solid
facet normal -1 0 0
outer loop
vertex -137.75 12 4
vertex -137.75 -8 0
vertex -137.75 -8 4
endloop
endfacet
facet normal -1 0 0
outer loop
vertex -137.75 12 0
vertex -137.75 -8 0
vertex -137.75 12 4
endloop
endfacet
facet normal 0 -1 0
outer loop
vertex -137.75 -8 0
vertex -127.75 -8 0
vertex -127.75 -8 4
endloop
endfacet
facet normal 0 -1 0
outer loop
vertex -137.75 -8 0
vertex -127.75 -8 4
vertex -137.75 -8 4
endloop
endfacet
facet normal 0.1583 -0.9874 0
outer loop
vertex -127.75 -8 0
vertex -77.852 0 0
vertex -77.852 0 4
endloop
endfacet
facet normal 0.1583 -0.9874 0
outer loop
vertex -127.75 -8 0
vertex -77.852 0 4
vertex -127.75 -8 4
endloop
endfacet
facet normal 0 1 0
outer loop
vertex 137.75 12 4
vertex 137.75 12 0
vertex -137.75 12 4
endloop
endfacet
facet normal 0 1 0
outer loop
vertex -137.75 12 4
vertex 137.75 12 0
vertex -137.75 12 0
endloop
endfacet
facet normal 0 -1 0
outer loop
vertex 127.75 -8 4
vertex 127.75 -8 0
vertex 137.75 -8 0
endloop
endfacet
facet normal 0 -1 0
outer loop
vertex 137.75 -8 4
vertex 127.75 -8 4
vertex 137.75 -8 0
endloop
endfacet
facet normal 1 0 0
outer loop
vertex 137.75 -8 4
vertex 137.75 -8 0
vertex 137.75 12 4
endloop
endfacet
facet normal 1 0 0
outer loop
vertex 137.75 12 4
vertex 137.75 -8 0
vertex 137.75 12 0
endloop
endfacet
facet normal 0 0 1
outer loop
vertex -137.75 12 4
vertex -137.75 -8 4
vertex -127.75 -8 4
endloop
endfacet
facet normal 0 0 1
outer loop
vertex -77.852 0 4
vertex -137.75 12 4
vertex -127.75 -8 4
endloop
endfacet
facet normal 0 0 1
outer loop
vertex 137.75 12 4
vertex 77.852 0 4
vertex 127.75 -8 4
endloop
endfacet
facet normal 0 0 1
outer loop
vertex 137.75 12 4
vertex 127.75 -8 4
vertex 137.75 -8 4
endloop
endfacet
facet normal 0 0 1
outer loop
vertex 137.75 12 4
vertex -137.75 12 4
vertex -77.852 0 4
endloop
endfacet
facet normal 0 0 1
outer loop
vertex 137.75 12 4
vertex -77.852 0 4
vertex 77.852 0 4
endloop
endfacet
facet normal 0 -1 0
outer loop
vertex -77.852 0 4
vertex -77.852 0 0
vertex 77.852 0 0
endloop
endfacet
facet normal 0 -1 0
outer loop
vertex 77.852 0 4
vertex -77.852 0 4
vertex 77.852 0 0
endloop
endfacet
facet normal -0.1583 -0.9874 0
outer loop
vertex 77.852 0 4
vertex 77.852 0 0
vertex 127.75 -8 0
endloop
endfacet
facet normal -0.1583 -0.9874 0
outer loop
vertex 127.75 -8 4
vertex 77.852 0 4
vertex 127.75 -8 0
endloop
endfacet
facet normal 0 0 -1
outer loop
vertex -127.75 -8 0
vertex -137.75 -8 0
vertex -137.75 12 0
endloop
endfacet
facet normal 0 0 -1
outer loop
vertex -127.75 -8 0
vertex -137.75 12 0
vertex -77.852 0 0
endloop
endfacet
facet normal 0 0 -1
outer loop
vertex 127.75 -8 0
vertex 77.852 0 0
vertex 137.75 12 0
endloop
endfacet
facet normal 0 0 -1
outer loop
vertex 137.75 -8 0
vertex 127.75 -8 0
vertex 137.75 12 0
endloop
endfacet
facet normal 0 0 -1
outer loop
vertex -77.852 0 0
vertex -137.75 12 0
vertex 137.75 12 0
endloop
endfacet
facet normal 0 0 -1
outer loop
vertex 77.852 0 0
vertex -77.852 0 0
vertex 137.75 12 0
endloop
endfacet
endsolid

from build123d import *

# Parameters (mm, degrees)
BOSS_EXTRUDE1_DEPTH = 4


with BuildPart() as part:
    # Sketch1 → Boss-Extrude1 (new body)
    with BuildSketch(Plane.XY):
        Polygon((0, 0), (-77.852222873, 0), (-127.75, -8), (-137.75, -8), (-137.75, 12), (0, 12), align=None)
    boss_extrude1 = extrude(amount=BOSS_EXTRUDE1_DEPTH)

    # Mirror1: Boss-Extrude1 across plane
    add(boss_extrude1.mirror(Plane(origin=(0, 0, 4), x_dir=(0, 0, 1), z_dir=(1, 0, 0))))


solid = part.part
